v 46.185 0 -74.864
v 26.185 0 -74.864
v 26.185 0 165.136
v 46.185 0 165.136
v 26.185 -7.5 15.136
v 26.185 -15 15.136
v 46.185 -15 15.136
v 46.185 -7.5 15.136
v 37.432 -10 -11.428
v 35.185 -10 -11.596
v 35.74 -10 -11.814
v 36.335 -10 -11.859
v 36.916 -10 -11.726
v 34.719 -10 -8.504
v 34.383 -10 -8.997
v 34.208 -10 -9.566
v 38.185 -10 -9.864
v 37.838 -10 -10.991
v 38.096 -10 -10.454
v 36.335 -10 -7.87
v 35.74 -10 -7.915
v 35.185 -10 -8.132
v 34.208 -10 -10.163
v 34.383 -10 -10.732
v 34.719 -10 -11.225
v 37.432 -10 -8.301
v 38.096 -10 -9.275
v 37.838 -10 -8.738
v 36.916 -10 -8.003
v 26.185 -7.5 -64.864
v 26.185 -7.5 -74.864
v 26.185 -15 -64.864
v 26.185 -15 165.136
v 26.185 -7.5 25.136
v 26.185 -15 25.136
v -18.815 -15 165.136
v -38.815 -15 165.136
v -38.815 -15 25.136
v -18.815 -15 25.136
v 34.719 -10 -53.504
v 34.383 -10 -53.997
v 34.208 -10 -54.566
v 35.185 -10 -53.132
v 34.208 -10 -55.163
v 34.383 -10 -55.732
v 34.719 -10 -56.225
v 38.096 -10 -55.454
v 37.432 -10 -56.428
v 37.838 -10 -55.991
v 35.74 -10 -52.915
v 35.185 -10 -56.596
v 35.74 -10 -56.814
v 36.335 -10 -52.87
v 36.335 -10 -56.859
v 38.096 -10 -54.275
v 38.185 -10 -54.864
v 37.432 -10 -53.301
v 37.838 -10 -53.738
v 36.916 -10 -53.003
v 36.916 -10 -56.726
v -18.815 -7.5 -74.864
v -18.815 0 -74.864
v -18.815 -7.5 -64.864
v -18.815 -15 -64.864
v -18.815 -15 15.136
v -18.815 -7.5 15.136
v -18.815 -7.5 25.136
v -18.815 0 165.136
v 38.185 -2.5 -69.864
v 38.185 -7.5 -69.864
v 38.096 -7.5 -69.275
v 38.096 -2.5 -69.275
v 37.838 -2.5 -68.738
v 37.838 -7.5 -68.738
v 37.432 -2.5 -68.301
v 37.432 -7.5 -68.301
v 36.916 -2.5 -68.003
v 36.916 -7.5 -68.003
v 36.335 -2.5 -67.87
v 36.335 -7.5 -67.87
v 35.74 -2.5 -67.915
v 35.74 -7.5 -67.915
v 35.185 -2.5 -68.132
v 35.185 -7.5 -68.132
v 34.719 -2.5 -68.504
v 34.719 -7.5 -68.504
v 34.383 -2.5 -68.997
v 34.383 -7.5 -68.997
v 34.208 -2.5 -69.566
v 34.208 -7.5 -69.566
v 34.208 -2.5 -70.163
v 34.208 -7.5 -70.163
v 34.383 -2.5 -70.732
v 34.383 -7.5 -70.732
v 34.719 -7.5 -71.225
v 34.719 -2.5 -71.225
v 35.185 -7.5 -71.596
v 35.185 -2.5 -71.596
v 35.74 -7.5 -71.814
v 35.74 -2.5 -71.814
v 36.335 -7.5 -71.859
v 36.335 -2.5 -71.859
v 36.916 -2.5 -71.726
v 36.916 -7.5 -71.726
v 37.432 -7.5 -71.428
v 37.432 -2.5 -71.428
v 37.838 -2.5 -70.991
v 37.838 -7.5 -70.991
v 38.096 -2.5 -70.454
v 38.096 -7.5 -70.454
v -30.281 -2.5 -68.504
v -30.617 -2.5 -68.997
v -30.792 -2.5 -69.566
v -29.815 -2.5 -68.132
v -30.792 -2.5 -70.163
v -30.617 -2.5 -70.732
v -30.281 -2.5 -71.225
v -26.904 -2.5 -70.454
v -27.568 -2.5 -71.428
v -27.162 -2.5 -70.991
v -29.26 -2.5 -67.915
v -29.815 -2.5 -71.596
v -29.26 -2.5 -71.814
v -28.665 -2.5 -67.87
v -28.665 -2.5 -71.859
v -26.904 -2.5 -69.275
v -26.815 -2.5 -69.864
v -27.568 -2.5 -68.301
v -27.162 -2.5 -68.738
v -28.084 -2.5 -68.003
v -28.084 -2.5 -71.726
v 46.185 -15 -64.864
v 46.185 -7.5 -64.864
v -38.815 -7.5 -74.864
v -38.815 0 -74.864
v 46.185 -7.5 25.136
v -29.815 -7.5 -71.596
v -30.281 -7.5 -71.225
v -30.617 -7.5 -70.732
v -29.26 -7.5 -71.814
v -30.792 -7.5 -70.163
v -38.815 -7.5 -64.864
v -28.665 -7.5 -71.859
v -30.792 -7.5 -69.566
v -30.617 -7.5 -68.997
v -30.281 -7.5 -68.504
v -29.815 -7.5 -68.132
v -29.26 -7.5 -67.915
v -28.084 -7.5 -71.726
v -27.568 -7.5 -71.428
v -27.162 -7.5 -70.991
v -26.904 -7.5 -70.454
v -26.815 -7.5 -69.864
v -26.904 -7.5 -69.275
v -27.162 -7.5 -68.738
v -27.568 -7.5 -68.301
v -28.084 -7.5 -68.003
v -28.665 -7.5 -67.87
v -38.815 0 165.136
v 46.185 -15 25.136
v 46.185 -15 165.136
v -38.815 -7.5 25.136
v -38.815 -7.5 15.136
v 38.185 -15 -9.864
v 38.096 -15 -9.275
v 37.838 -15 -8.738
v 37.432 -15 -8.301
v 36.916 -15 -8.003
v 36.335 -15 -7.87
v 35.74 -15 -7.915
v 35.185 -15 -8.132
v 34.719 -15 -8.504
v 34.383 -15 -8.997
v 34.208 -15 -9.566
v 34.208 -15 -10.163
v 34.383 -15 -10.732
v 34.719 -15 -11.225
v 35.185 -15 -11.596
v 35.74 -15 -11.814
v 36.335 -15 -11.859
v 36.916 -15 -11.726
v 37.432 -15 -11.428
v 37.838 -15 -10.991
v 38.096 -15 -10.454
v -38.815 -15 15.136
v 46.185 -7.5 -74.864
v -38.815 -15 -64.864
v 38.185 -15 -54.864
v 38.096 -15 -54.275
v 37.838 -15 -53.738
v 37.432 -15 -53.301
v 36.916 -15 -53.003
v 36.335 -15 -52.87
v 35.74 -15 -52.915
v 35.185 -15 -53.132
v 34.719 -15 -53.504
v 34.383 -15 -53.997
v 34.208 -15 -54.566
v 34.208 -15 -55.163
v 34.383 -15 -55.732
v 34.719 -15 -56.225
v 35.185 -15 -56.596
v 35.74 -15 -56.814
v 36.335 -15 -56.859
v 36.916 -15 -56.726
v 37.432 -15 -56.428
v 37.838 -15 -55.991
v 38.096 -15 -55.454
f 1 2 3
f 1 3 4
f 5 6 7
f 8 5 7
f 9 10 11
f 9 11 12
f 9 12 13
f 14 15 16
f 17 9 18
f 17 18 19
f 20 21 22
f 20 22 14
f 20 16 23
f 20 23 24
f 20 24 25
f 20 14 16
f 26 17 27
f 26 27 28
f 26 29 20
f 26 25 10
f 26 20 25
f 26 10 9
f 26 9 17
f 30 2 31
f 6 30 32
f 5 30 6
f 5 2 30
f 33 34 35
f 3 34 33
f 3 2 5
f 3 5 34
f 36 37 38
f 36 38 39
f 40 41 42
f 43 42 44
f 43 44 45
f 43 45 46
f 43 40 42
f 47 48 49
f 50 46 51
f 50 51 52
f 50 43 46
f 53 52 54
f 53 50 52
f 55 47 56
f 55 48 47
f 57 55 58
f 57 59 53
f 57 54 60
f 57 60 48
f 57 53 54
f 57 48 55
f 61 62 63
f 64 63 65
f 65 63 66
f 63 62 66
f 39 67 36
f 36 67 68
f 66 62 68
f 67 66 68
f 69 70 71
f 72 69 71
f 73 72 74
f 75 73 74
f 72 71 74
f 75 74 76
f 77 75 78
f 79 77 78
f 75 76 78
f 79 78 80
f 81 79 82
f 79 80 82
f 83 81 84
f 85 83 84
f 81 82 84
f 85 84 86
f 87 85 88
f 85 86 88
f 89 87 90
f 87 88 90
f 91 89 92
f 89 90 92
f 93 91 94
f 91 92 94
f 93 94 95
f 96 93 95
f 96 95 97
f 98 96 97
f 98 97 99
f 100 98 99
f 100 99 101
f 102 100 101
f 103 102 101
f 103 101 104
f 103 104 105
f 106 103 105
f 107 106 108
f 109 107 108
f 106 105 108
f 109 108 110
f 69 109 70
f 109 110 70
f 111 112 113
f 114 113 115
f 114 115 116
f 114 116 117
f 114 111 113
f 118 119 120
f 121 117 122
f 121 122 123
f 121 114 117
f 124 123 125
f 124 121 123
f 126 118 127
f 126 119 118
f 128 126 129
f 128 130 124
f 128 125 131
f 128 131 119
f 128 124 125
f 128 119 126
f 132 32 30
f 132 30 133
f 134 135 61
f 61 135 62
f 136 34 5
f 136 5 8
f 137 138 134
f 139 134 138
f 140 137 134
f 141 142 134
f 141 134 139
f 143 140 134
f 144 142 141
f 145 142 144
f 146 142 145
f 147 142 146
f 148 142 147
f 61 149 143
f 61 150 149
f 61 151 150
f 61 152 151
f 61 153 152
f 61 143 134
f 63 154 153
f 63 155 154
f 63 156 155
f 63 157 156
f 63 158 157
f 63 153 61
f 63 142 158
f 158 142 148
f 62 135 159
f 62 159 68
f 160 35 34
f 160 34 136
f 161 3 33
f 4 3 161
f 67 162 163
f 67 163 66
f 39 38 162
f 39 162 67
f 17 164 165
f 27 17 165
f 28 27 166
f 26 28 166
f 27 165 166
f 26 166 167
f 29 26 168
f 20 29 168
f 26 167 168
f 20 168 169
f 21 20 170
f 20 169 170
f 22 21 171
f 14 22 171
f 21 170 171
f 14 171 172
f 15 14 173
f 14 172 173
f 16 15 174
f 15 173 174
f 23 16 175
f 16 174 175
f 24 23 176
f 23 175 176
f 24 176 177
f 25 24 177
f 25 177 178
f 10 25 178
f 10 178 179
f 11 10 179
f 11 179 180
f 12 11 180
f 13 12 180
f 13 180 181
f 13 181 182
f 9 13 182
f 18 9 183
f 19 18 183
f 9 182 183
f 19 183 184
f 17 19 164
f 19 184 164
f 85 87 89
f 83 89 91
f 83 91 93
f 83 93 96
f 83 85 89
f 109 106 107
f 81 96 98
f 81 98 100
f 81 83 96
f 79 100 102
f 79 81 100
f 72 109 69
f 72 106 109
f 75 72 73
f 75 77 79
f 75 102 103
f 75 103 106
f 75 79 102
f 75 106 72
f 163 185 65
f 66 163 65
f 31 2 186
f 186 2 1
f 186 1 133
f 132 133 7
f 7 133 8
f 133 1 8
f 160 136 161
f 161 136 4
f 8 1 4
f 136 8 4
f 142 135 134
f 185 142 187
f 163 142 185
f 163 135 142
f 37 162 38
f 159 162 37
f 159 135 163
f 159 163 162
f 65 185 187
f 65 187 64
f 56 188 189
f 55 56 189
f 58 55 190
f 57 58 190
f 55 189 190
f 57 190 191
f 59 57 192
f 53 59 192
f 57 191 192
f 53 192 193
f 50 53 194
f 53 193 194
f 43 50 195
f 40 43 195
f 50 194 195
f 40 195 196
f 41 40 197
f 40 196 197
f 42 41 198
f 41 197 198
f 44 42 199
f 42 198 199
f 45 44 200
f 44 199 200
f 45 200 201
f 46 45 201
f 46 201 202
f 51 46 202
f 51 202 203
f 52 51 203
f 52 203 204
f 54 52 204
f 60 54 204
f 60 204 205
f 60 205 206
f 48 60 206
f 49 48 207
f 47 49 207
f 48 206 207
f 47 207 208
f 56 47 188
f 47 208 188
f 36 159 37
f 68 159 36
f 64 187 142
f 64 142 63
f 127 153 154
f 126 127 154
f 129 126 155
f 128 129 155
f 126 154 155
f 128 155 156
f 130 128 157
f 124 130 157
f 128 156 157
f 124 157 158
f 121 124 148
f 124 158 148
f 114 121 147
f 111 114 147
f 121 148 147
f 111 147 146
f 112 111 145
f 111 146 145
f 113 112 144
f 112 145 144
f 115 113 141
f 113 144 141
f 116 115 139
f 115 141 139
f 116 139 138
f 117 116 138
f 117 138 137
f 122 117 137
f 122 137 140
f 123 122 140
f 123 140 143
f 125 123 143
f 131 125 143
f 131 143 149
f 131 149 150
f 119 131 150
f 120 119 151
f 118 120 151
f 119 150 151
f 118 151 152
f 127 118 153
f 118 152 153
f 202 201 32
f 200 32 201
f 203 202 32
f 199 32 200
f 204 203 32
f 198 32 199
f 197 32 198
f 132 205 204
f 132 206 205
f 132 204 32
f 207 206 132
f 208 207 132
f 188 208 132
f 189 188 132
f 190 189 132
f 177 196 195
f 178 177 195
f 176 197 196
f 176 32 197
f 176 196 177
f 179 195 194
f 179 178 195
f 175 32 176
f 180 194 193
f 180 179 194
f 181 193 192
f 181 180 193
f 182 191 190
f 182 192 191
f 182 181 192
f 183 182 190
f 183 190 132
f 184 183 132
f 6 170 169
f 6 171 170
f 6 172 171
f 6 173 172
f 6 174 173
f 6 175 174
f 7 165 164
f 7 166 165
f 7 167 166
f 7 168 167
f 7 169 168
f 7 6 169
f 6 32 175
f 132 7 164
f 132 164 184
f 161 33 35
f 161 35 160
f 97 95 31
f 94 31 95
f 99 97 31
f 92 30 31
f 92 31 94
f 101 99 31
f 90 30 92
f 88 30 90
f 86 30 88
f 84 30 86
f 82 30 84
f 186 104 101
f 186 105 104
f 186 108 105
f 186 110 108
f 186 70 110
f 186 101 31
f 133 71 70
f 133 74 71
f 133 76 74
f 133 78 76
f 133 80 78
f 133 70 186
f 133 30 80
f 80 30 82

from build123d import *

# Parameters (mm, degrees)
F0_W     = 20
F0_H     = 240
F1_DEPTH = 15
F2_W     = 20
F2_H     = 10
F3_DEPTH = 7.5
F4_R     = 2
F5_DEPTH = 5
F7_R     = 2
F8_DEPTH = 5


with BuildPart() as f1:
    # F0 (on Front) → F1 (new body)
    with BuildSketch(Plane.XZ):
        with Locations((-28.814657, 45.135572)):
            Rectangle(F0_W, F0_H)
    extrude(amount=F1_DEPTH)

    # F2 (on face) → F3 (cut)
    with BuildSketch(Plane.XZ.offset(15)):
        with Locations((-28.814657, -69.864428)):
            Rectangle(F2_W, F2_H)
        with Locations((-28.814657, 20.135572)):
            Rectangle(F2_W, F2_H)
    extrude(amount=-F3_DEPTH, mode=Mode.SUBTRACT)

    # F4 (on face) → F5 (cut)
    with BuildSketch(Plane.XZ.offset(7.5)):
        with Locations((-28.814657, -69.864428)):
            Circle(F4_R)
    extrude(amount=-F5_DEPTH, mode=Mode.SUBTRACT)


with BuildPart() as f6_1:
    # F6: copy of F1
    add(f1.part.moved(Location((65, 0, 0))))

    # F7 (on face) → F8 (cut)
    with BuildSketch(Plane.XZ.offset(15)):
        with Locations((36.185343, -9.864428)):
            Circle(F7_R)
        with Locations((36.185343, -54.864428)):
            Circle(F7_R)
    extrude(amount=-F8_DEPTH, mode=Mode.SUBTRACT)


solid = Compound([f1.part, f6_1.part])
